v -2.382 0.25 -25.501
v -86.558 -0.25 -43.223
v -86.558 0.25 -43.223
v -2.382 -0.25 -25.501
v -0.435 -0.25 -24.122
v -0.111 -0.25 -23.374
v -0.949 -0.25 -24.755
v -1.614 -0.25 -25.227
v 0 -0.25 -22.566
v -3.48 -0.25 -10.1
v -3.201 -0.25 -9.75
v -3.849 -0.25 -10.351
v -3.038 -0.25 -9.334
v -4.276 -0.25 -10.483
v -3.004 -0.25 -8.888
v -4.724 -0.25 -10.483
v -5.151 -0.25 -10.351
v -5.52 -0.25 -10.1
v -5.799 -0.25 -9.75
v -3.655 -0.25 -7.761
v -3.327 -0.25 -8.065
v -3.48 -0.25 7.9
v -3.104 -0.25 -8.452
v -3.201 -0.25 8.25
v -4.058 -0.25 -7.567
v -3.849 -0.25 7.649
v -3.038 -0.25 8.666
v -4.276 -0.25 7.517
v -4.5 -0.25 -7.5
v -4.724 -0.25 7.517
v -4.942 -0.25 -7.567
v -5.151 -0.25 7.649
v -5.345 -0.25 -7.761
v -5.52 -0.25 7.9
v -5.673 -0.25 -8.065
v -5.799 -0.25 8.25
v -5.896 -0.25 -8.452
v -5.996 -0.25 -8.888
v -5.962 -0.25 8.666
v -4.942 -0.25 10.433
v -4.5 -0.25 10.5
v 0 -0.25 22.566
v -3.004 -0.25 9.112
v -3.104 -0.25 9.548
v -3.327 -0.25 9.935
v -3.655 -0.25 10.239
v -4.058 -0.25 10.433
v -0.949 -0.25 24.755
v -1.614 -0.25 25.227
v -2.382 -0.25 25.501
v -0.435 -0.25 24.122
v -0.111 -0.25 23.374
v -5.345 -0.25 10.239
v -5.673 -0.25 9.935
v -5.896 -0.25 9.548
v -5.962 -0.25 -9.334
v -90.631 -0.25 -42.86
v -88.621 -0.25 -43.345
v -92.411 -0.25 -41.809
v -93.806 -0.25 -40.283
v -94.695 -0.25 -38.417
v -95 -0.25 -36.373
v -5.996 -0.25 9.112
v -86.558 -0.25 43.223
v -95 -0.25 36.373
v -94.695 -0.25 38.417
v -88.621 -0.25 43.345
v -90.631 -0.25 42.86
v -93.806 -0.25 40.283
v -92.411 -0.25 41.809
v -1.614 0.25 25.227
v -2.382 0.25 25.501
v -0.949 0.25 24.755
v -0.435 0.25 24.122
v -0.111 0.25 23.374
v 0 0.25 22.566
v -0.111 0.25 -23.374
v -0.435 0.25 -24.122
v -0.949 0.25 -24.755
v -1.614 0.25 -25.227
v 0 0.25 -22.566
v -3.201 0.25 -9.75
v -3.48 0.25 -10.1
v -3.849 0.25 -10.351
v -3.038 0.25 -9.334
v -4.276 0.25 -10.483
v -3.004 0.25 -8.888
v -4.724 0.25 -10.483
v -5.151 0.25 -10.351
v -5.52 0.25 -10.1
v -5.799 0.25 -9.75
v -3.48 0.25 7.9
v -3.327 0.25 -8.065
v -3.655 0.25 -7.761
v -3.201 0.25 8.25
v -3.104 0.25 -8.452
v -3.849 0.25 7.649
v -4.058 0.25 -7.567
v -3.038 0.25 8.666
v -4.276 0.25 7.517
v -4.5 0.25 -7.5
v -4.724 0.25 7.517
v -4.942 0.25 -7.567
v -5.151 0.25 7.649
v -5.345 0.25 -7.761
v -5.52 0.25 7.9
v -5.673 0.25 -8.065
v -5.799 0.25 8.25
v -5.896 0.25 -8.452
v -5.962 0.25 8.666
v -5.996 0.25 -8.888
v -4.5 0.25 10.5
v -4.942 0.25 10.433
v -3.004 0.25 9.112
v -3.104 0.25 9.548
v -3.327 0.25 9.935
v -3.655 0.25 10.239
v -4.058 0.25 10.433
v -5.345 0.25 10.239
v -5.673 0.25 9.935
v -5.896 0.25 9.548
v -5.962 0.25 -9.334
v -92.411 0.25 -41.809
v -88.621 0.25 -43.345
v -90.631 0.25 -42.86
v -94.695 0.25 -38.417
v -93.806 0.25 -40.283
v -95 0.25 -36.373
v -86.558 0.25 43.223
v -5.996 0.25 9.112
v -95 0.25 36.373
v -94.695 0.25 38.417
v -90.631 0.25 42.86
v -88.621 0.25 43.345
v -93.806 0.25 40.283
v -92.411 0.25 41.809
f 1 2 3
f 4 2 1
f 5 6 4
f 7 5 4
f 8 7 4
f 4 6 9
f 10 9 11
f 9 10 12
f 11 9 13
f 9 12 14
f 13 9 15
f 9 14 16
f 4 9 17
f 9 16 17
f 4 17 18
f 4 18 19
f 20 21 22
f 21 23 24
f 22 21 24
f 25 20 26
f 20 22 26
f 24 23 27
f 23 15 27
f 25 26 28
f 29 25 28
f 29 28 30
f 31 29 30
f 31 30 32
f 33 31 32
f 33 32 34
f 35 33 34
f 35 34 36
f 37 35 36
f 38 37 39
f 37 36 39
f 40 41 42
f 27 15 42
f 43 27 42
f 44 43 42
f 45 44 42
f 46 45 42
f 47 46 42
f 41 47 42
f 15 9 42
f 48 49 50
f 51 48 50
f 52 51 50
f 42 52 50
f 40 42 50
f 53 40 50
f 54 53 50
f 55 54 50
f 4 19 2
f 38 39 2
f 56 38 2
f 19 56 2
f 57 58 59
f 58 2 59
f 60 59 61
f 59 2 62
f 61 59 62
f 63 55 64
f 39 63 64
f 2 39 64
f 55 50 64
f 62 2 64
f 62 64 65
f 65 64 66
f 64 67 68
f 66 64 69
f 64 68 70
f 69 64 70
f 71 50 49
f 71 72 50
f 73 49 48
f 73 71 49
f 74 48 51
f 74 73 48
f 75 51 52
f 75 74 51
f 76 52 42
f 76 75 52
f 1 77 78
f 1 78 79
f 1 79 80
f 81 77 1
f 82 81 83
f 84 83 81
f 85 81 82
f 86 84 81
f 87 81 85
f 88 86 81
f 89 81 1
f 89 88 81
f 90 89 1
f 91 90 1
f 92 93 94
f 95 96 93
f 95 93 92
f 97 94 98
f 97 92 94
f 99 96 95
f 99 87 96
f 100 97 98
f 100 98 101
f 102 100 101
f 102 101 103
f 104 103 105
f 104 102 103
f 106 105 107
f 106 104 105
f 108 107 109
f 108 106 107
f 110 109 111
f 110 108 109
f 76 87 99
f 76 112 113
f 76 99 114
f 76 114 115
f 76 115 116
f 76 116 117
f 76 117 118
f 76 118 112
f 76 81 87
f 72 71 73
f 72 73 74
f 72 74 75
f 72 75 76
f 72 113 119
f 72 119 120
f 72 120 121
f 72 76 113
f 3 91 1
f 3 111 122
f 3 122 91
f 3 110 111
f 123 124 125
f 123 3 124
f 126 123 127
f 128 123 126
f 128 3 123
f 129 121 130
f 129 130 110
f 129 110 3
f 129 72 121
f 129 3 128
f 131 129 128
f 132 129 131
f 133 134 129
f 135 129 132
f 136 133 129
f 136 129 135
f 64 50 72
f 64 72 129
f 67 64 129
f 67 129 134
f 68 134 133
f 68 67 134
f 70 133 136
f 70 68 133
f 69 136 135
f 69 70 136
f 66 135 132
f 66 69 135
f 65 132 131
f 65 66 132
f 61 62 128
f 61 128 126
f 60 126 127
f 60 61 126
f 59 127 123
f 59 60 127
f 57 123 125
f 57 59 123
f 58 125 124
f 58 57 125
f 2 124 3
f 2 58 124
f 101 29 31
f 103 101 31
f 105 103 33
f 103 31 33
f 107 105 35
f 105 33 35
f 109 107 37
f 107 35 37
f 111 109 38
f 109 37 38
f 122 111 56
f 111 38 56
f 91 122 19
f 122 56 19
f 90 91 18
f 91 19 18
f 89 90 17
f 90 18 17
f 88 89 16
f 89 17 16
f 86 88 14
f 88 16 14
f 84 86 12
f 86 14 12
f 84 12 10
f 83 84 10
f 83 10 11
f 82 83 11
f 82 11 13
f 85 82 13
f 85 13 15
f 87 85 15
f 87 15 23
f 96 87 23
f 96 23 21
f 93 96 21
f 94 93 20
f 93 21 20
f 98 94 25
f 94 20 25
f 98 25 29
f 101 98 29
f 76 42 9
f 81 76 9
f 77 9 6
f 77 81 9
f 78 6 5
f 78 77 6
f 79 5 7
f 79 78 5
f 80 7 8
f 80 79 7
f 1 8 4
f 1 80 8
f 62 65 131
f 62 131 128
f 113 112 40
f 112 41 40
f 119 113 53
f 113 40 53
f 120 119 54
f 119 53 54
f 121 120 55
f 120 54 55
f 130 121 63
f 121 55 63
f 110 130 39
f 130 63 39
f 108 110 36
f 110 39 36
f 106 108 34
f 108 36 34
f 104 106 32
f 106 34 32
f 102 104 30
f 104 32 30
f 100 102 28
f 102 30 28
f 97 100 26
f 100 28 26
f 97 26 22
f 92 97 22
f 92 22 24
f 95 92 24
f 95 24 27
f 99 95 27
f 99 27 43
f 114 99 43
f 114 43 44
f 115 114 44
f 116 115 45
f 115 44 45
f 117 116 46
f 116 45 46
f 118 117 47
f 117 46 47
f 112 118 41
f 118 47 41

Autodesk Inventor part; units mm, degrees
ref_plane "YZ Plane" through (0, 0, 0) normal (1, 0, 0) x (0, 1, 0)
ref_plane "XZ Plane" through (0, 0, 0) normal (0, 1, 0) x (-1, 0, 0)
ref_plane "XY Plane" through (0, 0, 0) normal (0, 0, 1) x (1, 0, 0)
sketch "Skizze1" plane through (0, 0, 0) normal (0, 1, 0) x (-1, 0, 0)
  line L0 (0, 25) -> (0, -25)
  line L1 (0, 25) -> (95, 45)
  line L2 (95, 45) -> (95, -45)
  line L3 (95, -45) -> (0, -25)
  point P0 (0, 0)
  point P1 (0, 0)
  dimension "d0" = 90
  dimension "d1" = 95
  dimension "d2" = 50
extrude "Grobblech1" add sketch "Skizze1" along normal mid plane 0.5
sketch "Skizze3" plane through (0, 0.25, 0) normal (0, 1, 0) x (1, 0, 0)
  line L0 (0, 25) -> (0, -25) projected
  point P0 (0, 0)
  point P1 (-4.5, -9)
  point P2 (-4.5, 9)
  dimension "d16" = 16
  dimension "d17" = 16
  dimension "d18" = 4.5
  dimension "d19" = 4.5
hole "Bohrung2" at (-4.5, 0.25, 9) at (-4.5, 0.25, -9) direction (0, -1, 0) diameter 3 end through all
fillet "Rundung1" radius 7 2 edges at (-95, 0, -45) (-95, 0, 45)
fillet "Rundung2" radius 3 2 edges at (0, 0, -25) (0, 0, 25)
equation "\"d3\" = Stärke"
equation "\"Biegeradius\" = Stärke"
equation "\"BreiteBiegungsfreistellung\" = Stärke"
equation "\"TiefeBiegungsfreistellung\" = 0.5 * Stärke"
equation "\"GrößeEckenfreistellung\" = 4 * Stärke"
equation "\"MinimalRest\" = 2 * Stärke"
equation "\"Übergangsradius\" = Biegeradius"
equation "\"JacobiRadiusGröße\" = Biegeradius"
equation "\"Abstandsgröße\" = Stärke"
equation "\"Stärke\" = 0.5"
properties part number "propeller_extensions" material "Glas"
